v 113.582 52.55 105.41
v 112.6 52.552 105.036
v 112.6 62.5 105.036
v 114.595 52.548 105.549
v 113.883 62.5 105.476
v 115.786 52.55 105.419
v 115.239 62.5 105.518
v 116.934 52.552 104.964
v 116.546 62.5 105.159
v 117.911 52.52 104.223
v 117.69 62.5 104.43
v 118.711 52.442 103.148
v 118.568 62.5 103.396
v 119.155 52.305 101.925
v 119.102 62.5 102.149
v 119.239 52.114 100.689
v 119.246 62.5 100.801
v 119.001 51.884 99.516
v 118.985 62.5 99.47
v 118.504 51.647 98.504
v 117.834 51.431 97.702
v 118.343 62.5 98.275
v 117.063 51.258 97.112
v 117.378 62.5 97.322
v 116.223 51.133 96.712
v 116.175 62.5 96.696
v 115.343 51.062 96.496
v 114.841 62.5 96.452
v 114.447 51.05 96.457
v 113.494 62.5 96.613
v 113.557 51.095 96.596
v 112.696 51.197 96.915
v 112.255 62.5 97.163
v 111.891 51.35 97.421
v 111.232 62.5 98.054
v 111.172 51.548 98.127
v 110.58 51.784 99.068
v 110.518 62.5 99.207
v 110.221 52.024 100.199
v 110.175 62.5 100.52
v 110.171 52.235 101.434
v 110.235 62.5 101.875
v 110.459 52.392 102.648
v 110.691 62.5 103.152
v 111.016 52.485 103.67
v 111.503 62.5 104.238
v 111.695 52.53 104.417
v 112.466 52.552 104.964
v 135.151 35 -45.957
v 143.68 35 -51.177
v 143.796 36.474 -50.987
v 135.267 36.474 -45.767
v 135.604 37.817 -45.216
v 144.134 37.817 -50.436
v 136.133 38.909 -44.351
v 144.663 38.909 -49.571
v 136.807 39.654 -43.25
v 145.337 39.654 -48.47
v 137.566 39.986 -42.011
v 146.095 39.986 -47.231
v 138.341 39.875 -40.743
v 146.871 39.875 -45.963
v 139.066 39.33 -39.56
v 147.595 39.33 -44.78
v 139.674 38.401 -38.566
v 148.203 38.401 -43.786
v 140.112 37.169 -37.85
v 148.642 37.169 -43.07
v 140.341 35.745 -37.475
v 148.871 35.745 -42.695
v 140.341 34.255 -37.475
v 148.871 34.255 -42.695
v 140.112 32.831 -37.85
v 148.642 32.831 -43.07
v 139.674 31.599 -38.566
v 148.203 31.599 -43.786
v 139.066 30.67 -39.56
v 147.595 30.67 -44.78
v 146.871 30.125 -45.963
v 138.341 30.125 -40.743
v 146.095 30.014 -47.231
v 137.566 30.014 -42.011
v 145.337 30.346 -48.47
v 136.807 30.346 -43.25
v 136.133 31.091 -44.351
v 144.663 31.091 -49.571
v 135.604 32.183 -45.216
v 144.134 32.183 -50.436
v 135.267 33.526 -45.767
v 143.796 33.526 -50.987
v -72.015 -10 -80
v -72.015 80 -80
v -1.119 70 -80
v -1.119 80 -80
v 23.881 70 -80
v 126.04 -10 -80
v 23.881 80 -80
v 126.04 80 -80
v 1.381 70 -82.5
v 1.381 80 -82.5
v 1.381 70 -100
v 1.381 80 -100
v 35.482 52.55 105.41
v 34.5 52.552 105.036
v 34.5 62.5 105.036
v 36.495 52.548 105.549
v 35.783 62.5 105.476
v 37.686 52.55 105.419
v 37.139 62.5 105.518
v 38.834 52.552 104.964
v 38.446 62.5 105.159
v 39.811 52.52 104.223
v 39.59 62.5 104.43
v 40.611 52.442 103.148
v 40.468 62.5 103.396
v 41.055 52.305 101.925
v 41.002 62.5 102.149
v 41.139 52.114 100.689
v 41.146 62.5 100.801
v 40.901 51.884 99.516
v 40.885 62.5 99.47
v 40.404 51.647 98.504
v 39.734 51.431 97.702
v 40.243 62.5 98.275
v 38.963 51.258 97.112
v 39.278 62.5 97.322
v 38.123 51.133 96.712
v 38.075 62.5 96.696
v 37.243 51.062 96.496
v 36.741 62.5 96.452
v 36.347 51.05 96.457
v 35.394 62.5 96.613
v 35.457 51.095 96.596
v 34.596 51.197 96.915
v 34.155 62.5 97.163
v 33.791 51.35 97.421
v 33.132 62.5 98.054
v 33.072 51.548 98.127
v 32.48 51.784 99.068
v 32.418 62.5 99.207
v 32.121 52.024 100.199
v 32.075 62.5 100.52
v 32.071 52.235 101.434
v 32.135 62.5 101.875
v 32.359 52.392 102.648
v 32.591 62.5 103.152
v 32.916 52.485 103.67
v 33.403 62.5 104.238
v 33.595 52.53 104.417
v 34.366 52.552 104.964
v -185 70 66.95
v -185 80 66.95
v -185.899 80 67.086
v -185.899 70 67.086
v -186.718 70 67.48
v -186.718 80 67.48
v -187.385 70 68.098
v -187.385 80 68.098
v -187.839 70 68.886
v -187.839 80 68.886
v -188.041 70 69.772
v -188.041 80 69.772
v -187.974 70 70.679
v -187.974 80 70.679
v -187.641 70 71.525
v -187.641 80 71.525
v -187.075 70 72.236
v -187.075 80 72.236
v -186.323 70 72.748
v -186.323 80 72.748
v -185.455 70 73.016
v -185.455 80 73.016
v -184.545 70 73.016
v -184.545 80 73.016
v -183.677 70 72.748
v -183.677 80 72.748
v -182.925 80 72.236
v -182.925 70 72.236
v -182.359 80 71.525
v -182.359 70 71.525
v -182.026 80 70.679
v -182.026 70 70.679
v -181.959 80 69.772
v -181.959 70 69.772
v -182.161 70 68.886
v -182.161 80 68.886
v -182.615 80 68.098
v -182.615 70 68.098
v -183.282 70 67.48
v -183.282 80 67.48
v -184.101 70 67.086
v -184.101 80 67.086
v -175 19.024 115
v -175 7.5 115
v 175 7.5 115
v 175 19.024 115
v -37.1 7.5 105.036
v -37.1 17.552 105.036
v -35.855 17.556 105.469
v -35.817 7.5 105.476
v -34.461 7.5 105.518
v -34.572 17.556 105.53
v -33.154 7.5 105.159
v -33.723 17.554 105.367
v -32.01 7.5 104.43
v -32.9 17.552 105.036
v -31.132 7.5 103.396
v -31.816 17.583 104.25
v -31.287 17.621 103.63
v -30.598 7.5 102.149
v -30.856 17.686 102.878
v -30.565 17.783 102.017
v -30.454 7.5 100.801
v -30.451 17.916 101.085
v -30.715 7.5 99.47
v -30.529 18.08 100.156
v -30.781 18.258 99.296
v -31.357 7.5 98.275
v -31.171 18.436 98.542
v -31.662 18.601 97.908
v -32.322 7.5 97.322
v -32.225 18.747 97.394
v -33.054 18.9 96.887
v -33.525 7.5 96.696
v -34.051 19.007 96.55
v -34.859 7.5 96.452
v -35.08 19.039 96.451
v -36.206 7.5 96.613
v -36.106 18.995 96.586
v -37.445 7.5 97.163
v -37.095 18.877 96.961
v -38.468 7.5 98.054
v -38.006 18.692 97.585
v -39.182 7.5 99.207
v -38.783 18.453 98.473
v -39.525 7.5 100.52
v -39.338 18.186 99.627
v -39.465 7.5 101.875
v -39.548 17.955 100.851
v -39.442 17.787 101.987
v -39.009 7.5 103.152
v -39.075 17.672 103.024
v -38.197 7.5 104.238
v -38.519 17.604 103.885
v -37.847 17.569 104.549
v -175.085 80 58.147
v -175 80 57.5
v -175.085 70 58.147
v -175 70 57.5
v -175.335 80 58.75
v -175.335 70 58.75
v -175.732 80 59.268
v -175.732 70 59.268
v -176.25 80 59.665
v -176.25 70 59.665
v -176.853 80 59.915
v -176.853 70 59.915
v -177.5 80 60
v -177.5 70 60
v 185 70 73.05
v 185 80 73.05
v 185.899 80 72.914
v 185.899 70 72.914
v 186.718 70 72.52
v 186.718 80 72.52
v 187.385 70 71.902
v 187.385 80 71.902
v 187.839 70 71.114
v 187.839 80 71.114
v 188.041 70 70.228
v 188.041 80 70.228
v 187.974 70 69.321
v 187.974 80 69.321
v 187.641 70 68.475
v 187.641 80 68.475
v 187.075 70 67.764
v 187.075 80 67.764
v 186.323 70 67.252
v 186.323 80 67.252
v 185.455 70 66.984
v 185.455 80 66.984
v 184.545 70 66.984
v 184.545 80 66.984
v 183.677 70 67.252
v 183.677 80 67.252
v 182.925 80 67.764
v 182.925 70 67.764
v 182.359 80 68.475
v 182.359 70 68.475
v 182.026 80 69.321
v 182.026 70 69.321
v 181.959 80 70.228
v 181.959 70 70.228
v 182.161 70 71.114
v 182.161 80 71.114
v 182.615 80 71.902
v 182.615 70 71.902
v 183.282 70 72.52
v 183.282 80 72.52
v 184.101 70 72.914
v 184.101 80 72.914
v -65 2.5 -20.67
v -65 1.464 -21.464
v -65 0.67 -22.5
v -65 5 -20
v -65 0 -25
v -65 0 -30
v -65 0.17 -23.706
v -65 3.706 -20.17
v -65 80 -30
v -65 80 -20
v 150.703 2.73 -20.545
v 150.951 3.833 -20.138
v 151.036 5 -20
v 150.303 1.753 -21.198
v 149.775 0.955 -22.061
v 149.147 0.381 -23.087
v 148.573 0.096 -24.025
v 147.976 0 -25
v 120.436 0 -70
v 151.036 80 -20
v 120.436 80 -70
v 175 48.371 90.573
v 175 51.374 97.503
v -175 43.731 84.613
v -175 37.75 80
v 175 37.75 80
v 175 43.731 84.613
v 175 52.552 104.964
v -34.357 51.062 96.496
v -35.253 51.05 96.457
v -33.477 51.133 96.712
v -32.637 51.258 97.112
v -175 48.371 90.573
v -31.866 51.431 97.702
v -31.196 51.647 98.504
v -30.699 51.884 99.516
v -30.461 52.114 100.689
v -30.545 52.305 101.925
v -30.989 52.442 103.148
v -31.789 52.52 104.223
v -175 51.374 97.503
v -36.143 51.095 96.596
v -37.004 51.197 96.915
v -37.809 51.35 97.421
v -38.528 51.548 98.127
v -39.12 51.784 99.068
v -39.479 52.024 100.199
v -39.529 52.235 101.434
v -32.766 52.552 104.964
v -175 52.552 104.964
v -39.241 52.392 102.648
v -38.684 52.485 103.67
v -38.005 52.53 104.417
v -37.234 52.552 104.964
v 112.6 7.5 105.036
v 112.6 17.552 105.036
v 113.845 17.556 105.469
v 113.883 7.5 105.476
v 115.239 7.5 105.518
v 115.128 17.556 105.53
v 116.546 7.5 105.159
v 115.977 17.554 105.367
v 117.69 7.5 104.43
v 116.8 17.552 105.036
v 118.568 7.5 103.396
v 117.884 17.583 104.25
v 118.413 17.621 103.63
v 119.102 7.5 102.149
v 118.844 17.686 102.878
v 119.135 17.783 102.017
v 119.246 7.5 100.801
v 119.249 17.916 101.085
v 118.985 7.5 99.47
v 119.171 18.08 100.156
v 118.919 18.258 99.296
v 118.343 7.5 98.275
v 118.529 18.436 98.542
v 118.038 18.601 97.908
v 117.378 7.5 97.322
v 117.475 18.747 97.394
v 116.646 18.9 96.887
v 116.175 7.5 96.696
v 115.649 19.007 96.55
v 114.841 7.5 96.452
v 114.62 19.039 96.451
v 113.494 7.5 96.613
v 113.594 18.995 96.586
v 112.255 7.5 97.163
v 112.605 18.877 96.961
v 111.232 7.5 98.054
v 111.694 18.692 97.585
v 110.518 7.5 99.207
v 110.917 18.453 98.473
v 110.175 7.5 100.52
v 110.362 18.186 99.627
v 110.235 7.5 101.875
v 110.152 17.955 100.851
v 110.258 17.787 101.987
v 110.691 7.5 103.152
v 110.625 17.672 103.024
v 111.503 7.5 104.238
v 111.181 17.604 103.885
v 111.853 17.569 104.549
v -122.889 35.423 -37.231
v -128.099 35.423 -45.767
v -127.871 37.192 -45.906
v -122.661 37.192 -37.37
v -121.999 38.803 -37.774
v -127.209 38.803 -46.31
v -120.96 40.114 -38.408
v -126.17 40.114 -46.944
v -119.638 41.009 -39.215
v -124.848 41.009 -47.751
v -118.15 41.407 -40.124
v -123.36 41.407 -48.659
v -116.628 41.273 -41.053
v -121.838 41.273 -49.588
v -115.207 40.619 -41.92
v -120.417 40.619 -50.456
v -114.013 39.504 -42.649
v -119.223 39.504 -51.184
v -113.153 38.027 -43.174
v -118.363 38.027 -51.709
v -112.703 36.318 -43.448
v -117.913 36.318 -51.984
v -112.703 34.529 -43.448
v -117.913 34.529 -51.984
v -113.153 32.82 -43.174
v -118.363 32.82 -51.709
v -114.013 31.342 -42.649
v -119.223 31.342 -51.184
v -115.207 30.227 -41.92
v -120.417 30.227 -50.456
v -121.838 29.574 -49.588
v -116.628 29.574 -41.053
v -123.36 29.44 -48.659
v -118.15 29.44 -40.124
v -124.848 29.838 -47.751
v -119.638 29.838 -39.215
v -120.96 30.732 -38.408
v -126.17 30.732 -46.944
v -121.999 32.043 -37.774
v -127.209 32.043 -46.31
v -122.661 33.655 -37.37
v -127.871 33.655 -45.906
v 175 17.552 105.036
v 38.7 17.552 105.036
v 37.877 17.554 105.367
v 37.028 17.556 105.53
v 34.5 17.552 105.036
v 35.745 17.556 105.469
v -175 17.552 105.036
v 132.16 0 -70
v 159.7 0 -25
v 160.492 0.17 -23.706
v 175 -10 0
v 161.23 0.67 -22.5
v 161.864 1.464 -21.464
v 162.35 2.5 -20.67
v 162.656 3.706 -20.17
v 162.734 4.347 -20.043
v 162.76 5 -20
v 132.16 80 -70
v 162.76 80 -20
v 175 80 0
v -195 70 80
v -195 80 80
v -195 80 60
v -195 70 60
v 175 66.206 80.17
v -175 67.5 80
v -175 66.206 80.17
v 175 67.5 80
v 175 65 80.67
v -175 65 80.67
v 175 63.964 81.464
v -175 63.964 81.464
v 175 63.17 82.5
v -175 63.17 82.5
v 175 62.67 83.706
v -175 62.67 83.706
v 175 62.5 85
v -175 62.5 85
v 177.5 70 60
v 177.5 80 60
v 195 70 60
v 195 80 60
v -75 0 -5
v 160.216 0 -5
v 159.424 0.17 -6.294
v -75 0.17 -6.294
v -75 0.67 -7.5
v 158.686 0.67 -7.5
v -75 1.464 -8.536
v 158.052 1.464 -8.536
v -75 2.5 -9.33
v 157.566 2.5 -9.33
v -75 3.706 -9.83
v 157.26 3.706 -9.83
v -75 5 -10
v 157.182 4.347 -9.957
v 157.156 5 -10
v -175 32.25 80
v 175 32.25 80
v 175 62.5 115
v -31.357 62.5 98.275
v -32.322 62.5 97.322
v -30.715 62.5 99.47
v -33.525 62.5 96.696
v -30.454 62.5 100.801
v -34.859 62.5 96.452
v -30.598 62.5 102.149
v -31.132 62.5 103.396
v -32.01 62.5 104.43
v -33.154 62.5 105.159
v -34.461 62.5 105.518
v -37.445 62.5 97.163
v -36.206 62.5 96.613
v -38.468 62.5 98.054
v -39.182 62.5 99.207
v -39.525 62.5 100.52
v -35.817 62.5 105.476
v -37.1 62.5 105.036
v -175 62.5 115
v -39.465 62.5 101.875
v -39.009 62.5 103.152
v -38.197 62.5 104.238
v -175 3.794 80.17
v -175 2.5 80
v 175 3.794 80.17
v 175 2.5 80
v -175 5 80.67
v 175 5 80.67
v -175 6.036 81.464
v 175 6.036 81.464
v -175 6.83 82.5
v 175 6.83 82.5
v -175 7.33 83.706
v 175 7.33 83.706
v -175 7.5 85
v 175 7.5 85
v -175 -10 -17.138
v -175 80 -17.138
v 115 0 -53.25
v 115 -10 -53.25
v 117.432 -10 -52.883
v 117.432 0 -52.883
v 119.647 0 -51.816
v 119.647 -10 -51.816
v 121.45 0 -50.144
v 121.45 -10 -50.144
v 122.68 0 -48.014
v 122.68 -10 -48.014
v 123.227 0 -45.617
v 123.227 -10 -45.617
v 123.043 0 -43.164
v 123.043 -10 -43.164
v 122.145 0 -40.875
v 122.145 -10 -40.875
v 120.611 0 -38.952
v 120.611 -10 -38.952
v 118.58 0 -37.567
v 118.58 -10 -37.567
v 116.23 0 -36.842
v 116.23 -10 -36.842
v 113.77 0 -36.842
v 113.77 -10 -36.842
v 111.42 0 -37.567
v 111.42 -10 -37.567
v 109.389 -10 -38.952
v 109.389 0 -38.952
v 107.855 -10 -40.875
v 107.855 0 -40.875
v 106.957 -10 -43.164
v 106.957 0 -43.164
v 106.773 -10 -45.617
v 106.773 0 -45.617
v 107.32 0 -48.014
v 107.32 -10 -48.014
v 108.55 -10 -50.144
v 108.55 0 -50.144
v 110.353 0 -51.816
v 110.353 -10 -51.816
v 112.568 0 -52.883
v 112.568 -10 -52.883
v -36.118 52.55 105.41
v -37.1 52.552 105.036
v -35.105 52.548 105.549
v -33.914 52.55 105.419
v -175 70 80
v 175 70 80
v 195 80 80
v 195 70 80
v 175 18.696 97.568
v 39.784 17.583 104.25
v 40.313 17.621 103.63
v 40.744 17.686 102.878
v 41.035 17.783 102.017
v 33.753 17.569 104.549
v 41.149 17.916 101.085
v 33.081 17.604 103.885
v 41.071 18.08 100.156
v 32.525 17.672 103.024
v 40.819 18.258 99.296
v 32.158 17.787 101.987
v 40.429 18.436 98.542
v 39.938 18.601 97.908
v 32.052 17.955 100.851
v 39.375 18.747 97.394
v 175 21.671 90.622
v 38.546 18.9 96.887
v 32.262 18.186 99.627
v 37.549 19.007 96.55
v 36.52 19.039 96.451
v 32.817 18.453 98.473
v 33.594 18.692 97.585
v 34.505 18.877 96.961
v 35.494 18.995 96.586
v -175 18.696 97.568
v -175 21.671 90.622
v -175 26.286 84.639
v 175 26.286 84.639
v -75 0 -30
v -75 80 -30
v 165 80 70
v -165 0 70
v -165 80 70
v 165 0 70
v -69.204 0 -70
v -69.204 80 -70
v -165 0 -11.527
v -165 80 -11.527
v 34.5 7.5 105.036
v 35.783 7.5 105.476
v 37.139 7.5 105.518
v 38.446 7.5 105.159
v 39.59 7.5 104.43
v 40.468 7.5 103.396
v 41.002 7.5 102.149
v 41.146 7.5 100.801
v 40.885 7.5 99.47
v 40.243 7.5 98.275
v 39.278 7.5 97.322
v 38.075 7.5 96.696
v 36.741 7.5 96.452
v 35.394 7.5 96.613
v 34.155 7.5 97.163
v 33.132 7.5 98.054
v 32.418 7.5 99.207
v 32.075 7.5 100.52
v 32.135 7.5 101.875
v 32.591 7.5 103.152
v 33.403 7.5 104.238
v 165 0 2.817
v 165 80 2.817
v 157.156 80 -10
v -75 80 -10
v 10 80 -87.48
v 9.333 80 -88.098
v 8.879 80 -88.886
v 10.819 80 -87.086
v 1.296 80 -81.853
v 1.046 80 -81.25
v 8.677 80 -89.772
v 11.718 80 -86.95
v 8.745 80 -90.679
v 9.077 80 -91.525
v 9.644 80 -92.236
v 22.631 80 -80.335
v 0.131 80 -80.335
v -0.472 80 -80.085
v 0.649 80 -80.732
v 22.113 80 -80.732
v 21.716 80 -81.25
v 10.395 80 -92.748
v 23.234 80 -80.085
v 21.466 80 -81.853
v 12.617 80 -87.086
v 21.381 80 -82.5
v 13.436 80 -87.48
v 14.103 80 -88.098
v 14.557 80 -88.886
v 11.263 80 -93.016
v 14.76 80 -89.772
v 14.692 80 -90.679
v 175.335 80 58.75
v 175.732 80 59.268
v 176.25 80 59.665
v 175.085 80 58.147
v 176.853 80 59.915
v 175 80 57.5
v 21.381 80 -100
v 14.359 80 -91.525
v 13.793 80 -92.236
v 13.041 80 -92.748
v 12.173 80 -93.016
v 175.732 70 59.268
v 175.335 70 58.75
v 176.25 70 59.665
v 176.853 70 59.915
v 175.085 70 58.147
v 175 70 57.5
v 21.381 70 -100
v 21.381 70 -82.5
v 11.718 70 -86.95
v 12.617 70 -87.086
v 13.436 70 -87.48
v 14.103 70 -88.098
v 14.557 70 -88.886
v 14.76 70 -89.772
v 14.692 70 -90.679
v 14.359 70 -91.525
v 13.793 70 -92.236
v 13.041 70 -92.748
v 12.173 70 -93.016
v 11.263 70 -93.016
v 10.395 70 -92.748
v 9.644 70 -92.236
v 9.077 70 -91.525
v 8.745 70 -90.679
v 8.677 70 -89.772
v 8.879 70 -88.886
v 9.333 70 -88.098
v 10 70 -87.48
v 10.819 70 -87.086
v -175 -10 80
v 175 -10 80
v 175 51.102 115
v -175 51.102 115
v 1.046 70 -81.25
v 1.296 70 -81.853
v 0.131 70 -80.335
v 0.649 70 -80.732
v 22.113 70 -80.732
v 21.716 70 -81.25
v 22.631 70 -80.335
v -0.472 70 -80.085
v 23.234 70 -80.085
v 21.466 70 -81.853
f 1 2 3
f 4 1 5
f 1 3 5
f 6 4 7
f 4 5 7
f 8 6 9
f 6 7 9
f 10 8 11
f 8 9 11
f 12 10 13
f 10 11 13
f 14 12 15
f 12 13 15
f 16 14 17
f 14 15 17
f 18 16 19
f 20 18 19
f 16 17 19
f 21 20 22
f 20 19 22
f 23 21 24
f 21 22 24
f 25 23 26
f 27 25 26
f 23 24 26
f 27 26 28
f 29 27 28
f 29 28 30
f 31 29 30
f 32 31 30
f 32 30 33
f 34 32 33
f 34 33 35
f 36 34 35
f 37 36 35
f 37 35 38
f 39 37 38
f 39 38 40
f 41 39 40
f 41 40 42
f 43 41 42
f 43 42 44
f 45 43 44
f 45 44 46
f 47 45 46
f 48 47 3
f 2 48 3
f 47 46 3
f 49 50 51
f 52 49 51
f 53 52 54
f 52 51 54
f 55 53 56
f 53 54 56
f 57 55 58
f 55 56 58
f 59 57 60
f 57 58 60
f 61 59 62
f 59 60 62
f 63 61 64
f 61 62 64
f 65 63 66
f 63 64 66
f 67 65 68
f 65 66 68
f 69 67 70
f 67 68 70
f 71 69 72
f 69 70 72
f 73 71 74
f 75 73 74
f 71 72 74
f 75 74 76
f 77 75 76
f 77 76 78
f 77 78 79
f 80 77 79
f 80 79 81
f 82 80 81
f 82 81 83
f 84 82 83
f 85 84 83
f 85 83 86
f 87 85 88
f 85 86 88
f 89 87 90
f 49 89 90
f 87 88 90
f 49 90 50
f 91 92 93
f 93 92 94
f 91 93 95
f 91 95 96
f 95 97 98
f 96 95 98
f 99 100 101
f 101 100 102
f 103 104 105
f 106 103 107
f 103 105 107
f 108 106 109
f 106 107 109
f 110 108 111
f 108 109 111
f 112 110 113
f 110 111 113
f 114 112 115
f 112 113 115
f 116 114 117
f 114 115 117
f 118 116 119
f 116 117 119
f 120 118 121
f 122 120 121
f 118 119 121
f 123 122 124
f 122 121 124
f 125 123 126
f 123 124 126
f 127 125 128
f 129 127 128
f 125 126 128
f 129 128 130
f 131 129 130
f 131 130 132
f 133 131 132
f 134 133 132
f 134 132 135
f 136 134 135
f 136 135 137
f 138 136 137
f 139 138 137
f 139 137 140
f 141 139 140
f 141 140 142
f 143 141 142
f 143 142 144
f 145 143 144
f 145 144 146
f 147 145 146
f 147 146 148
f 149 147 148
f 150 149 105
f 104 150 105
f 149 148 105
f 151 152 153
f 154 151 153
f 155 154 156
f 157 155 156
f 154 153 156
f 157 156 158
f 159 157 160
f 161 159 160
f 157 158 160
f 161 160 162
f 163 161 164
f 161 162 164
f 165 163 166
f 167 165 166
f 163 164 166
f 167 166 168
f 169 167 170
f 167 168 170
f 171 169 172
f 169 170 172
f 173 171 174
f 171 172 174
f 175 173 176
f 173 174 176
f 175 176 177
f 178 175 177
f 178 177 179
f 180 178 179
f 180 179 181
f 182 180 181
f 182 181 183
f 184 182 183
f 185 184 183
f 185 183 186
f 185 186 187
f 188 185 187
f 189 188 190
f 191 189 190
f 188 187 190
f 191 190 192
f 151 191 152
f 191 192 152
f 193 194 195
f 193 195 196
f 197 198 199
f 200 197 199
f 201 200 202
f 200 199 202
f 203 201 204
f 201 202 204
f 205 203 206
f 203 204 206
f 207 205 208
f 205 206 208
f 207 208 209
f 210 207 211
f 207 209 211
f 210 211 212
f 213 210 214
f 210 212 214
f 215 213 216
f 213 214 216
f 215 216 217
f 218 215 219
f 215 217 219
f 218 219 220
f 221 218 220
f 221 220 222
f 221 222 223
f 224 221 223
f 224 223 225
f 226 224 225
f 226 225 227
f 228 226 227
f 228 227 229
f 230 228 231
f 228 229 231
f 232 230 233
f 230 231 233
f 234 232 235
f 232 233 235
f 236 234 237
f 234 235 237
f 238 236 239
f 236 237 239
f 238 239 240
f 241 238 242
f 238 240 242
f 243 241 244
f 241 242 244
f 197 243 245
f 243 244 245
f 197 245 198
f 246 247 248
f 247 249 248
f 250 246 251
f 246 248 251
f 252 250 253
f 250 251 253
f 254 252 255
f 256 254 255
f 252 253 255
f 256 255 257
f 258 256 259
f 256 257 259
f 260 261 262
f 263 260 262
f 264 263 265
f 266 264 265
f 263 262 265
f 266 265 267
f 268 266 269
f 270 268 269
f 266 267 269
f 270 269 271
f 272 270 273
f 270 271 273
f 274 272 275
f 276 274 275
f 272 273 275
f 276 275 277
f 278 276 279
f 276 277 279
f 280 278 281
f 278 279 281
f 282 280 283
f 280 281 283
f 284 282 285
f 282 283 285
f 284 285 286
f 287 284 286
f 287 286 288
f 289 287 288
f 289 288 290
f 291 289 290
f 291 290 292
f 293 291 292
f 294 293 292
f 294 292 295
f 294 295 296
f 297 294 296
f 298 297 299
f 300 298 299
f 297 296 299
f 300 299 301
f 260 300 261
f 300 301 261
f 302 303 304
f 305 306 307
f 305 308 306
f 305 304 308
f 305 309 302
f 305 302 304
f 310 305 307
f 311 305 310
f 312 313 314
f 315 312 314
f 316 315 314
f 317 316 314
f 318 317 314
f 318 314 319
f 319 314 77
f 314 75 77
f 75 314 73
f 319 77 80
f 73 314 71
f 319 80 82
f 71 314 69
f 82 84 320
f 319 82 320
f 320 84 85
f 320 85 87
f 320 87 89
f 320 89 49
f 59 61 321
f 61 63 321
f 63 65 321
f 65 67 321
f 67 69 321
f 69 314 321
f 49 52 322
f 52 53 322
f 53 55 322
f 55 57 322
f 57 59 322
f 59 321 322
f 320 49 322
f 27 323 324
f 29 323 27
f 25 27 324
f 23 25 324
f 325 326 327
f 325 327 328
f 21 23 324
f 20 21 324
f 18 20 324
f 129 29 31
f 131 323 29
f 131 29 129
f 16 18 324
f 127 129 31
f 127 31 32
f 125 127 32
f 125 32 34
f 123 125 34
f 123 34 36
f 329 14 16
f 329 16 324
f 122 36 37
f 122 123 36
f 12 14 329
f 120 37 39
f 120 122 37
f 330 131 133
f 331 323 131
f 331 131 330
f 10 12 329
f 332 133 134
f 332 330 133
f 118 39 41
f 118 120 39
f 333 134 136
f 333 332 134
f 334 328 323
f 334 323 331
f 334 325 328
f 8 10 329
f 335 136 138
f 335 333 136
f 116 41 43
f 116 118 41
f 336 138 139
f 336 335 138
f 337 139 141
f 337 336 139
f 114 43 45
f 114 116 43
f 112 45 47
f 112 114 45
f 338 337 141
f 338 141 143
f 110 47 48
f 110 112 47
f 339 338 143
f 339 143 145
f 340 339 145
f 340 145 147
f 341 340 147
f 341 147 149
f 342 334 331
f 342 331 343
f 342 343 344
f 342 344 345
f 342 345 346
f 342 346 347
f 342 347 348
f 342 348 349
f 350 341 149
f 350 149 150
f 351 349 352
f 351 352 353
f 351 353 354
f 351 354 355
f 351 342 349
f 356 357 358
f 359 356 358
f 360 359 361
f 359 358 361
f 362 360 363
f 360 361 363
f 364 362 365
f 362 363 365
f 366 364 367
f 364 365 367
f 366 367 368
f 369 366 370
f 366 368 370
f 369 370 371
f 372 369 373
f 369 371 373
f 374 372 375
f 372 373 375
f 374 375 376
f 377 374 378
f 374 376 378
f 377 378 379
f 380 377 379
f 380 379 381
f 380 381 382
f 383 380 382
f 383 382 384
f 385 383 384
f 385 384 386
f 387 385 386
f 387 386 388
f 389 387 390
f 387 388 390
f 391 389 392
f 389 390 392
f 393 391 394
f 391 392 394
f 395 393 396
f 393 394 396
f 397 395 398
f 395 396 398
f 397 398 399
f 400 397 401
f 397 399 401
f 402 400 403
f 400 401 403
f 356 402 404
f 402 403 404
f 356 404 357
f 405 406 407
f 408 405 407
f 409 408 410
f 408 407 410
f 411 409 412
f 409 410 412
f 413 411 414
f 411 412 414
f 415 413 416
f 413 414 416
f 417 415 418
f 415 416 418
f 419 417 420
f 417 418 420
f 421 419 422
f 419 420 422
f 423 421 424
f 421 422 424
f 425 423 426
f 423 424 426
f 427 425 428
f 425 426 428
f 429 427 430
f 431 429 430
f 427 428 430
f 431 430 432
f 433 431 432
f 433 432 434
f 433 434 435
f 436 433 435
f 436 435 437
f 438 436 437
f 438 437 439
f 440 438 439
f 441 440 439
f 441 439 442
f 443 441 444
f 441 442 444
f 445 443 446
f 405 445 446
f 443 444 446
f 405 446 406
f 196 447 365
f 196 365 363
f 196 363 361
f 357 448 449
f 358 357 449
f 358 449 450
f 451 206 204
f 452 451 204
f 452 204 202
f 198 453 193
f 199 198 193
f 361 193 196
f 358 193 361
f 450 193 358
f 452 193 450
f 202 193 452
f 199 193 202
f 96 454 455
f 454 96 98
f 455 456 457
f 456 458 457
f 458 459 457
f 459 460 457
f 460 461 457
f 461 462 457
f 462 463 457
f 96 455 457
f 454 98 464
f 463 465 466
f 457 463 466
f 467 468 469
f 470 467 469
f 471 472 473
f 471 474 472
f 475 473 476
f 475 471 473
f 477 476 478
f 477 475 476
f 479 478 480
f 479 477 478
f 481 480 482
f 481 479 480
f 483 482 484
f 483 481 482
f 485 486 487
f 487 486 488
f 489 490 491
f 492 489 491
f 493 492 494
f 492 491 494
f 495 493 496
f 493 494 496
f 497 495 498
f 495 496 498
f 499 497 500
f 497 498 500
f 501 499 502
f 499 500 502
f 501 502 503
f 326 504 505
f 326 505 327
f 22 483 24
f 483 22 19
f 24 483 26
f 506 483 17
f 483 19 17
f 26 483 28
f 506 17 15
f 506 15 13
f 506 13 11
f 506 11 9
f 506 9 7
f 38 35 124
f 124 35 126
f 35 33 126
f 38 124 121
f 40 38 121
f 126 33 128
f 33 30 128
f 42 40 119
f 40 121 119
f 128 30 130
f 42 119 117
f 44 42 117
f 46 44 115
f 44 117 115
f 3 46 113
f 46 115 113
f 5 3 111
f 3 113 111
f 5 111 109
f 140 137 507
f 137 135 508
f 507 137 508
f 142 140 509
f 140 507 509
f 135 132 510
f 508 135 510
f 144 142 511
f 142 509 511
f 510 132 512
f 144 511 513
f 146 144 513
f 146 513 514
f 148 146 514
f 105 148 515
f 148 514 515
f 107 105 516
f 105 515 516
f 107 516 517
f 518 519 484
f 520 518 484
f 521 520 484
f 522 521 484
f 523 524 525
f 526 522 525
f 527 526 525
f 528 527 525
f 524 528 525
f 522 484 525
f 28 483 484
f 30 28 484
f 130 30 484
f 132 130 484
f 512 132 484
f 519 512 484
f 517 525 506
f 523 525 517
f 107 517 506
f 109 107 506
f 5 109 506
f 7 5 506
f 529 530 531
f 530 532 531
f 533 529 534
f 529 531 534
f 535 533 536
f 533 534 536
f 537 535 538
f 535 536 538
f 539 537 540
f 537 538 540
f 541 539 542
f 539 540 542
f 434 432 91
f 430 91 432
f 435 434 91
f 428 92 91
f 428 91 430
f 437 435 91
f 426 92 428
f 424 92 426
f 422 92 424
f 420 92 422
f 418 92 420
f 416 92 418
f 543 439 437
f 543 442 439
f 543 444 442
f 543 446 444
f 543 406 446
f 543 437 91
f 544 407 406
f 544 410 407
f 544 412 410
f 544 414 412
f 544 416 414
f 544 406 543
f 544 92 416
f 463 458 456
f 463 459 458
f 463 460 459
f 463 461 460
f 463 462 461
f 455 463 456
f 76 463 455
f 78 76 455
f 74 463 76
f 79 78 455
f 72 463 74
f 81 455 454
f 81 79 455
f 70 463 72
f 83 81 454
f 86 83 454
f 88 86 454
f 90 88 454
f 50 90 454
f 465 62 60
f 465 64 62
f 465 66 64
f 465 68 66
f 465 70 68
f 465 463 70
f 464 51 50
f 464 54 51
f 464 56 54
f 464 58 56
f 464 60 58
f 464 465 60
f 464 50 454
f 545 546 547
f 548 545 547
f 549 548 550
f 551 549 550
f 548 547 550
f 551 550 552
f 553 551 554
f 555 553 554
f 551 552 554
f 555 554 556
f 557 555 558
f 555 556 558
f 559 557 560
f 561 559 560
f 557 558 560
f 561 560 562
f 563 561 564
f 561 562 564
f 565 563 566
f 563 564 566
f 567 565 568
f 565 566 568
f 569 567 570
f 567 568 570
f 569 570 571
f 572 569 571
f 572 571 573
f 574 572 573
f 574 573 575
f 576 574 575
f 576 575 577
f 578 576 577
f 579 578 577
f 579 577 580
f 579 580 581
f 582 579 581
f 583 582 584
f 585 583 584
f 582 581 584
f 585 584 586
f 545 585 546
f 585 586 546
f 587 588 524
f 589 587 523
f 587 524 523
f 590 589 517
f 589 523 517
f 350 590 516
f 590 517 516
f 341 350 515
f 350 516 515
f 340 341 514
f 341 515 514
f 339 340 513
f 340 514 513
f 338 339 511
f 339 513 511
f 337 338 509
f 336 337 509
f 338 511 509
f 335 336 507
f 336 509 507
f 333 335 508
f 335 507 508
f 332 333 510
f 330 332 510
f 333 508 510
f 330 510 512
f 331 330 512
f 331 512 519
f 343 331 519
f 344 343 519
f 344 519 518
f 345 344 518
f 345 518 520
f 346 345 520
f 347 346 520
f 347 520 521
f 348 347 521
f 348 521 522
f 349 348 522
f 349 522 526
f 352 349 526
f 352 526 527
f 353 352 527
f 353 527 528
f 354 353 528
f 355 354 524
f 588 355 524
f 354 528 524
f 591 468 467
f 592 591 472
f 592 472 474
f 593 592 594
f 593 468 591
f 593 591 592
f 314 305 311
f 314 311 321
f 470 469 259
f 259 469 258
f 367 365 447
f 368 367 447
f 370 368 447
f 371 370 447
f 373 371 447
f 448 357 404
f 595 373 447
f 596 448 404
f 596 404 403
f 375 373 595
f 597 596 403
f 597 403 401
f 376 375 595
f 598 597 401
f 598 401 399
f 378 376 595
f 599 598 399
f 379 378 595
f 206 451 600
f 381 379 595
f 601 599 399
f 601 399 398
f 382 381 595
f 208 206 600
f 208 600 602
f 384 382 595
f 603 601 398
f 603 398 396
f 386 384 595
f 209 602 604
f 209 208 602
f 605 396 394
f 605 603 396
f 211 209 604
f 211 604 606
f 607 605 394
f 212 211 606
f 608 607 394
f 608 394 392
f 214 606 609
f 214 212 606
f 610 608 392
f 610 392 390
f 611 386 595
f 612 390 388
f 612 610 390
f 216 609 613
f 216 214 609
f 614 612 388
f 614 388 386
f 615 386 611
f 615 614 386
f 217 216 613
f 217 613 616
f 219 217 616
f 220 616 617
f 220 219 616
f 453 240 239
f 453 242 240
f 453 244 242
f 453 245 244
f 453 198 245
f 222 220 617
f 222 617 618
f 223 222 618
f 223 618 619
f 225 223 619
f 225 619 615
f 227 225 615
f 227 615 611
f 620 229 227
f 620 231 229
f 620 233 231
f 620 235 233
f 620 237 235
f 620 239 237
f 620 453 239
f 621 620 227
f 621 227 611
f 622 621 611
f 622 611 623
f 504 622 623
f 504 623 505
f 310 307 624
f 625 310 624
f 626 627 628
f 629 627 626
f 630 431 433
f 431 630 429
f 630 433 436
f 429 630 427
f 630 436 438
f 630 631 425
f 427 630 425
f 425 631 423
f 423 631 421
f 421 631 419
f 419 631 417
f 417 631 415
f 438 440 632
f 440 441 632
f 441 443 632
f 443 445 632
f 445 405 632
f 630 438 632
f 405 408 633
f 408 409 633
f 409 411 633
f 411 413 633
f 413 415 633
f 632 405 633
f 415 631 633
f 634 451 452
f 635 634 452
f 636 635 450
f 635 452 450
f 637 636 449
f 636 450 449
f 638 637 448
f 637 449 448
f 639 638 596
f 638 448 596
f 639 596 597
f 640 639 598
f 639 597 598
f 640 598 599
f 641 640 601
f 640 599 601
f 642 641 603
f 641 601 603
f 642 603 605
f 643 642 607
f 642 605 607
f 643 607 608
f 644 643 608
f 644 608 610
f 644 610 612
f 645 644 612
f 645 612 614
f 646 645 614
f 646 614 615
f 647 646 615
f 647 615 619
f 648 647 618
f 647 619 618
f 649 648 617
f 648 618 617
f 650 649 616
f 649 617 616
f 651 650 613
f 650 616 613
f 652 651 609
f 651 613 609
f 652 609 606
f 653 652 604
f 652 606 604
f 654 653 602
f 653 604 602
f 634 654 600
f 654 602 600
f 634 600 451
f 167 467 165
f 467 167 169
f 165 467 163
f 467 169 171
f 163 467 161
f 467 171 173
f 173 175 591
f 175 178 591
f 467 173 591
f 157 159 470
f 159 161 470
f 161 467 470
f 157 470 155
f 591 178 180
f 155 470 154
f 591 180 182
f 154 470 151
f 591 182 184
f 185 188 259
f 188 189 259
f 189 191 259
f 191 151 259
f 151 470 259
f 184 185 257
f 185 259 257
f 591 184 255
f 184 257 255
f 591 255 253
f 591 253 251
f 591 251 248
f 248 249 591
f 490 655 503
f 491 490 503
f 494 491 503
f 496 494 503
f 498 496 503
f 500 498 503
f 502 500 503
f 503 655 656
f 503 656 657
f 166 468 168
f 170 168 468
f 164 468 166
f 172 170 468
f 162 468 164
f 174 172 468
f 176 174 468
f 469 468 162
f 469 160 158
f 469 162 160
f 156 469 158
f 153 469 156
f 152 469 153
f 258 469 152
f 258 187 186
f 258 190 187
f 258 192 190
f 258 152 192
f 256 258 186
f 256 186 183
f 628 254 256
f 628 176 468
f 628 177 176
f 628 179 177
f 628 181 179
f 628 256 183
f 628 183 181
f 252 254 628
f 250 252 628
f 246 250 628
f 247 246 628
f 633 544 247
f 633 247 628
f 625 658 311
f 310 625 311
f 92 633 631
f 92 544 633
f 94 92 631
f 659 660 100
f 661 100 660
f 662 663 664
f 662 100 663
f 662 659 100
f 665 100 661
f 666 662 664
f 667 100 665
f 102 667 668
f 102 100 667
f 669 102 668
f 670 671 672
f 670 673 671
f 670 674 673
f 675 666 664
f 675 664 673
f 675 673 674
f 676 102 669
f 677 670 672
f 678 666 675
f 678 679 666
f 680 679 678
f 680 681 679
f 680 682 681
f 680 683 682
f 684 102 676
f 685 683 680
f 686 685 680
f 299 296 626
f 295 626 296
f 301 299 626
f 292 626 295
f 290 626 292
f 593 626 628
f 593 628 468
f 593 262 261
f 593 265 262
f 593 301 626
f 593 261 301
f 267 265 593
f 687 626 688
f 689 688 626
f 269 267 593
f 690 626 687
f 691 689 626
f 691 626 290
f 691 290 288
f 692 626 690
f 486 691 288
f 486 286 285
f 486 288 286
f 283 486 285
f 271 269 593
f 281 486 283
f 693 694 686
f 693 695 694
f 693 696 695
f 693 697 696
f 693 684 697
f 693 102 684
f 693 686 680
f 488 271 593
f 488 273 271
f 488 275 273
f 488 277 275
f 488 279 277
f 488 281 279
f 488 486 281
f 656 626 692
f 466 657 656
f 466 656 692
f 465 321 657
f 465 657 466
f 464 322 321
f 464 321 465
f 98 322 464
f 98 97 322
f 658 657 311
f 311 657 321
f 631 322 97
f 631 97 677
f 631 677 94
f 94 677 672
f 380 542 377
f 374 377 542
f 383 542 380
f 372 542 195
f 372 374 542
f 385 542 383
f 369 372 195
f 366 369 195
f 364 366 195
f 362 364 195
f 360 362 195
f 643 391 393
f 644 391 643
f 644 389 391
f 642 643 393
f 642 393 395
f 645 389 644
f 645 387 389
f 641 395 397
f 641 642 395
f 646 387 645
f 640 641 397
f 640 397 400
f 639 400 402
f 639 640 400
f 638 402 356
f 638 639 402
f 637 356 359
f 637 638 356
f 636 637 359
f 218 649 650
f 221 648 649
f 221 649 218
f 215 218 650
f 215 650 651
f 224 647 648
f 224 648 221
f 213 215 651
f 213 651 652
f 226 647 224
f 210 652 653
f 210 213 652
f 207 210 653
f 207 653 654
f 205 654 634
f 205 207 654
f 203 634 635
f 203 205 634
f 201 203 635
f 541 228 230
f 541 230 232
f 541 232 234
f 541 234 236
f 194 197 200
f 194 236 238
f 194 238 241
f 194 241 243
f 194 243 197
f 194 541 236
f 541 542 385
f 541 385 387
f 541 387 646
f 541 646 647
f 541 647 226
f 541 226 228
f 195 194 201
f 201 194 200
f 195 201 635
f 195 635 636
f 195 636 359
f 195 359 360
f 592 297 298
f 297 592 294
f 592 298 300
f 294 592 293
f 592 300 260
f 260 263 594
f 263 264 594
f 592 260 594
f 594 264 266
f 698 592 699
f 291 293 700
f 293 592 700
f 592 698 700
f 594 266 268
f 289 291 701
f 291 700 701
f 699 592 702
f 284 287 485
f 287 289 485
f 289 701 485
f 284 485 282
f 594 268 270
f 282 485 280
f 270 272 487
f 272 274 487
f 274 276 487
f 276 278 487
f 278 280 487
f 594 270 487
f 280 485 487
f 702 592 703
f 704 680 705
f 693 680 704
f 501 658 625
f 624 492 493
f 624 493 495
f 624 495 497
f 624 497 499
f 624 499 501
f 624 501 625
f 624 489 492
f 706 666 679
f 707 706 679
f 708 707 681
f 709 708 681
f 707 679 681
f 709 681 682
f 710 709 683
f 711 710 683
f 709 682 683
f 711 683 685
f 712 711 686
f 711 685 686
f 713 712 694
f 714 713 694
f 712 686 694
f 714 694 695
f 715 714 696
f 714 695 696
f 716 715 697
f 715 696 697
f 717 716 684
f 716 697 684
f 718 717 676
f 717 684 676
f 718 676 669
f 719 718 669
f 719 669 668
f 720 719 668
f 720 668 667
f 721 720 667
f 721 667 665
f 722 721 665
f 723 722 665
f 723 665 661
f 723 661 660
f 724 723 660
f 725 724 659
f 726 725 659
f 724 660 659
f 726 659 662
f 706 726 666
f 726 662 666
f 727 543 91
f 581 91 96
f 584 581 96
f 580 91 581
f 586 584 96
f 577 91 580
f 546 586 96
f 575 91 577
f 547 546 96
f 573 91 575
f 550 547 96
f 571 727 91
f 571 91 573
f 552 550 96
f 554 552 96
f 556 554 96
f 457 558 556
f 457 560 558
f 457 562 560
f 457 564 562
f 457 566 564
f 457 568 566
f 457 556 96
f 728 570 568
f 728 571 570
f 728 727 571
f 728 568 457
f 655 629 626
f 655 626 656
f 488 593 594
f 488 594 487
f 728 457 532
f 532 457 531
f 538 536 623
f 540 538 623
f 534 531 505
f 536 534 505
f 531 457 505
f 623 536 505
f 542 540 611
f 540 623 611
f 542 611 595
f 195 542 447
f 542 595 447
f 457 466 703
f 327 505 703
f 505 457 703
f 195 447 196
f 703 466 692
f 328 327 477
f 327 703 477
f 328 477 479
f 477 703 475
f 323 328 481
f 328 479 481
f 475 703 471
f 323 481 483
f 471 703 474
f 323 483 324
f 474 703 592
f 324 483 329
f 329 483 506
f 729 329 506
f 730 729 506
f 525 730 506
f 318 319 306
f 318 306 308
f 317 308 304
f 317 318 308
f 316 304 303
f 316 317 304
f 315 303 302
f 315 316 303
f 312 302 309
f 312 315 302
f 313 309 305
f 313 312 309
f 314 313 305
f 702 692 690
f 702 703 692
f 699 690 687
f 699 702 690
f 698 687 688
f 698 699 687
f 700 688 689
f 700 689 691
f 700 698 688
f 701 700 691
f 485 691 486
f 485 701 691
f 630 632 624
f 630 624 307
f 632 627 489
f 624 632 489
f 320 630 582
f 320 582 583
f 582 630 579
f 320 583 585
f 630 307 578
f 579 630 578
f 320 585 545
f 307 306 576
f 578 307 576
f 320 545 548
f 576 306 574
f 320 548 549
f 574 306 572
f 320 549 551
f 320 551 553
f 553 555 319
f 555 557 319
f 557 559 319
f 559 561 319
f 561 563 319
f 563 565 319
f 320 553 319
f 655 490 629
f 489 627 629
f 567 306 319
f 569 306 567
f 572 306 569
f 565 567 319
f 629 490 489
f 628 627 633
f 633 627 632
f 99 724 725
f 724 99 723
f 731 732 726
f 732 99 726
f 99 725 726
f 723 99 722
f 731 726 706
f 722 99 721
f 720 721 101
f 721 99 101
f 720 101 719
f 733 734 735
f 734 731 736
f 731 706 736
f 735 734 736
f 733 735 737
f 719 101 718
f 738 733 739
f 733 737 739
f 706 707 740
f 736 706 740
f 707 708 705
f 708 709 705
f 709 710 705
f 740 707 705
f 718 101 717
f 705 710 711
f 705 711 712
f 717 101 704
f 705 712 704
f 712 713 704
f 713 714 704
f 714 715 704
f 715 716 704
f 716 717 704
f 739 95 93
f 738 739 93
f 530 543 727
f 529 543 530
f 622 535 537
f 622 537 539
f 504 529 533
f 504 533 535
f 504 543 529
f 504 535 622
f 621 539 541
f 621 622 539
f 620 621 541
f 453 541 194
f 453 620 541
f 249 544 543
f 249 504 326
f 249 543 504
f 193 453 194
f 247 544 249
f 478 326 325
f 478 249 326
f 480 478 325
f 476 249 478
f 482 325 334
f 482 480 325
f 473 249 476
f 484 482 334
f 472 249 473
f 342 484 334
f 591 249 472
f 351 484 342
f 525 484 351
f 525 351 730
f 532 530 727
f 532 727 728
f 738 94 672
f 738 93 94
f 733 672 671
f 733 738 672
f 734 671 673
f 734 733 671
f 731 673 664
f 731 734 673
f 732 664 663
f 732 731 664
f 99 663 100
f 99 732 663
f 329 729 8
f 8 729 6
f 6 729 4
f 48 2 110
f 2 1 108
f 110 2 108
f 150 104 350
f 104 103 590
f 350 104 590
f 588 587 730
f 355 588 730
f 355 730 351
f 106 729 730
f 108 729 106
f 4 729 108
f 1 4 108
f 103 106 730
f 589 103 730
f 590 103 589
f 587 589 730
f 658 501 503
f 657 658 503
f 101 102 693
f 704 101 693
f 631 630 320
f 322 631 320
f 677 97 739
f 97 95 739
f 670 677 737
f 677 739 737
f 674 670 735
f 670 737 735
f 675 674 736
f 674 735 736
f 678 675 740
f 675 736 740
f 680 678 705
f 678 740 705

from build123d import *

# Parameters (mm, degrees)
SKETCH1_W            = 350
SKETCH1_H            = 160
SKETCH1_W_2          = 330
SKETCH1_H_2          = 140
BOSS_EXTRUDE1_DEPTH  = 80
SKETCH2_W            = 350
SKETCH2_H            = 160
BOSS_EXTRUDE2_DEPTH  = 10
SKETCH3_W            = 240
SKETCH3_H            = 10
BOSS_EXTRUDE3_DEPTH  = 80
SKETCH4_R            = 8.25
CUT_EXTRUDE1_DEPTH   = 10
SKETCH5_W            = 10
SKETCH5_H            = 80
BOSS_EXTRUDE4_DEPTH  = 10
SKETCH6_W            = 35
SKETCH6_H            = 55
BOSS_EXTRUDE5_DEPTH  = 350
CUT_EXTRUDE2_DEPTH   = 377.994694923
SKETCH8_R            = 4.55
CUT_EXTRUDE3_DEPTH   = 222.599300704
SKETCH9_W            = 20
SKETCH9_H            = 20
SKETCH9_R            = 3.05
BOSS_EXTRUDE7_DEPTH  = 10
FILLET1_R            = 5
CUT_EXTRUDE5_DEPTH   = 244.618554386
SKETCH13_W           = 120.654432285
SKETCH13_H           = 90
BOSS_EXTRUDE8_DEPTH  = 10
CUT_EXTRUDE8_DEPTH   = 244.618554386
SKETCH15_W           = 93.792566681
SKETCH15_H           = 90
BOSS_EXTRUDE9_DEPTH  = 10
SKETCH16_W           = 20
SKETCH16_H           = 20
SKETCH16_R           = 3.05
BOSS_EXTRUDE10_DEPTH = 10
SKETCH17_R           = 5
CUT_EXTRUDE9_DEPTH   = 10
SKETCH18_R           = 6
CUT_EXTRUDE10_DEPTH  = 10
FILLET2_R            = 2.5


with BuildPart() as part:
    # Sketch1 → Boss-Extrude1 (new body)
    with BuildSketch(Plane(origin=(0, 0, 0), x_dir=(1, 0, 0), z_dir=(0, 1, 0))):
        Rectangle(SKETCH1_W, SKETCH1_H)
        Rectangle(SKETCH1_W_2, SKETCH1_H_2, mode=Mode.SUBTRACT)
    extrude(amount=BOSS_EXTRUDE1_DEPTH)

    # Sketch2 → Boss-Extrude2 (add)
    with BuildSketch(Plane.XZ):
        Rectangle(SKETCH2_W, SKETCH2_H)
    extrude(amount=BOSS_EXTRUDE2_DEPTH)

    # Sketch3 → Boss-Extrude3 (add)
    with BuildSketch(Plane(origin=(0, 0, 0), x_dir=(1, 0, 0), z_dir=(0, 1, 0))):
        with Locations((45, 15)):
            Rectangle(SKETCH3_W, SKETCH3_H)
    extrude(amount=BOSS_EXTRUDE3_DEPTH)

    # Sketch4 → Cut-Extrude1 (cut)
    with BuildSketch(Plane.XZ.offset(10)):
        with Locations(Location((115, -45, 0), (0, 0, 270))):
            Circle(SKETCH4_R)
    extrude(amount=-CUT_EXTRUDE1_DEPTH, mode=Mode.SUBTRACT)

    # Sketch5 → Boss-Extrude4 (add)
    with BuildSketch(Plane(origin=(0, 0, -20), x_dir=(-1, 0, 0), z_dir=(0, 0, -1))):
        with Locations((70, 40)):
            Rectangle(SKETCH5_W, SKETCH5_H)
    extrude(amount=BOSS_EXTRUDE4_DEPTH)

    # Sketch6 → Boss-Extrude5 (add)
    with BuildSketch(Plane.ZY.offset(175)):
        with Locations((97.5, 35)):
            Rectangle(SKETCH6_W, SKETCH6_H)
    extrude(amount=-BOSS_EXTRUDE5_DEPTH)

    # Sketch7 → Cut-Extrude2 (cut, through all)
    with BuildSketch(Plane.ZY.offset(175)):
        with BuildLine():
            Line((80, 32.25), (80, 37.75))
            ThreePointArc((80, 37.75), (90.572772871, 48.370529591), (104.96357244, 52.551924426))
            add(Edge.make_bspline(
                [(105.036319557, 17.552000028), (130.036265556, 17.603962255), (129.999891997, 35.103924454), (129.963518438, 52.603886653), (104.96357244, 52.551924426)],
                knots=[1.570796327, 1.570796327, 1.570796327, 3.141592654, 3.141592654, 4.71238898, 4.71238898, 4.71238898], degree=2, weights=[1, 0.707106781, 1, 0.707106781, 1]))
            ThreePointArc((105.036319557, 17.552000028), (90.621814813, 21.670798719), (80, 32.25))
        make_face()
    extrude(amount=-CUT_EXTRUDE2_DEPTH, mode=Mode.SUBTRACT)

    # Sketch8 → Cut-Extrude3 (cut, through all)
    with BuildSketch(Plane(origin=(0, 62.5, 0), x_dir=(1, 0, 0), z_dir=(0, 1, 0))):
        with Locations(Location((-35, -101, 0), (0, 0, 242.51146341))):
            Circle(SKETCH8_R)
        with Locations(Location((36.6, -101, 0), (0, 0, 242.51146341))):
            Circle(SKETCH8_R)
        with Locations(Location((114.7, -101, 0), (0, 0, 242.51146341))):
            Circle(SKETCH8_R)
    extrude(amount=-CUT_EXTRUDE3_DEPTH, mode=Mode.SUBTRACT)

    # Sketch9 → Boss-Extrude7 (add)
    # profile 1 of 2: a face of its own
    with BuildSketch(Plane(origin=(0, 80, 0), x_dir=(1, 0, 0), z_dir=(0, 1, 0))):
        with Locations((185, -70)):
            Rectangle(SKETCH9_W, SKETCH9_H)
        with Locations(Location((185, -70, 0), (0, 0, 270))):
            Circle(SKETCH9_R, mode=Mode.SUBTRACT)
    # profile 2 of 2: a face of its own
    with BuildSketch(Plane(origin=(0, 80, 0), x_dir=(1, 0, 0), z_dir=(0, 1, 0))):
        with Locations((-185, -70)):
            Rectangle(SKETCH9_W, SKETCH9_H)
        with Locations(Location((-185, -70, 0), (0, 0, 90))):
            Circle(SKETCH9_R, mode=Mode.SUBTRACT)
    extrude(amount=-BOSS_EXTRUDE7_DEPTH)

    # Fillet1
    fillet1_edges = [part.edges().sort_by_distance(p)[0] for p in [
        (45, 0, -10),
        (50, 0, -20),
        (0, 7.5, 80),
        (0, 62.5, 80),
    ]]
    fillet(fillet1_edges, radius=FILLET1_R)

    # Sketch12 → Cut-Extrude5 (cut, through all)
    with BuildSketch(Plane(origin=(0, 80, 0), x_dir=(1, 0, 0), z_dir=(0, 1, 0))):
        Polygon((-72.01506271, 80), (-175, 17.138288908), (-175, 80), align=None)
    extrude(amount=-CUT_EXTRUDE5_DEPTH, mode=Mode.SUBTRACT)

    # Sketch13 → Boss-Extrude8 (add)
    with BuildSketch(Plane(origin=(-55.124817516, 0, -90.309757345), x_dir=(-0.8535528727753664, 0, 0.5210062316104475), z_dir=(-0.5210062316104475, 0, -0.8535528727753664))):
        with Locations((80.115381273, 35)):
            Rectangle(SKETCH13_W, SKETCH13_H)
    extrude(amount=-BOSS_EXTRUDE8_DEPTH)

    # Sketch14 → Cut-Extrude8 (cut, through all)
    with BuildSketch(Plane(origin=(0, 80, 0), x_dir=(1, 0, 0), z_dir=(0, 1, 0))):
        Polygon((126.04036801, 80), (175, 0), (175, 80), align=None)
    extrude(amount=-CUT_EXTRUDE8_DEPTH, mode=Mode.SUBTRACT)

    # Sketch15 → Boss-Extrude9 (add)
    with BuildSketch(Plane(origin=(127.315471061, 0, -77.916482622), x_dir=(-0.5219990637024984, 0, -0.8529460577866077), z_dir=(0.8529460577866077, 0, -0.5219990637024984))):
        with Locations((-44.453552808, 35)):
            Rectangle(SKETCH15_W, SKETCH15_H)
    extrude(amount=-BOSS_EXTRUDE9_DEPTH)

    # Sketch16 → Boss-Extrude10 (add)
    with BuildSketch(Plane(origin=(0, 80, 0), x_dir=(1, 0, 0), z_dir=(0, 1, 0))):
        with Locations((11.381009241, 90)):
            Rectangle(SKETCH16_W, SKETCH16_H)
        with Locations(Location((11.718047049, 90, 0), (0, 0, 270))):
            Circle(SKETCH16_R, mode=Mode.SUBTRACT)
    extrude(amount=-BOSS_EXTRUDE10_DEPTH)

    # Sketch17 → Cut-Extrude9 (cut)
    with BuildSketch(Plane(origin=(127.315471061, 0, -77.916482622), x_dir=(-0.5219990637024984, 0, -0.8529460577866076), z_dir=(0.8529460577866077, 0, -0.5219990637024985))):
        with Locations((-36.349836148, 35)):
            Circle(SKETCH17_R)
    extrude(amount=-CUT_EXTRUDE9_DEPTH, mode=Mode.SUBTRACT)

    # Sketch18 → Cut-Extrude10 (cut)
    with BuildSketch(Plane(origin=(-55.124817516, 0, -90.309757345), x_dir=(-0.8535528727753664, 0, 0.5210062316104476), z_dir=(-0.5210062316104476, 0, -0.8535528727753664))):
        with Locations((79.494288209, 35.423286216)):
            Circle(SKETCH18_R)
    extrude(amount=-CUT_EXTRUDE10_DEPTH, mode=Mode.SUBTRACT)

    # Fillet2
    fillet2_edges = [part.edges().sort_by_distance(p)[0] for p in [
        (175, 75, 60),
        (-175, 75, 60),
        (1.381009241, 75, -80),
        (21.381009241, 75, -80),
    ]]
    fillet(fillet2_edges, radius=FILLET2_R)


solid = part.part
